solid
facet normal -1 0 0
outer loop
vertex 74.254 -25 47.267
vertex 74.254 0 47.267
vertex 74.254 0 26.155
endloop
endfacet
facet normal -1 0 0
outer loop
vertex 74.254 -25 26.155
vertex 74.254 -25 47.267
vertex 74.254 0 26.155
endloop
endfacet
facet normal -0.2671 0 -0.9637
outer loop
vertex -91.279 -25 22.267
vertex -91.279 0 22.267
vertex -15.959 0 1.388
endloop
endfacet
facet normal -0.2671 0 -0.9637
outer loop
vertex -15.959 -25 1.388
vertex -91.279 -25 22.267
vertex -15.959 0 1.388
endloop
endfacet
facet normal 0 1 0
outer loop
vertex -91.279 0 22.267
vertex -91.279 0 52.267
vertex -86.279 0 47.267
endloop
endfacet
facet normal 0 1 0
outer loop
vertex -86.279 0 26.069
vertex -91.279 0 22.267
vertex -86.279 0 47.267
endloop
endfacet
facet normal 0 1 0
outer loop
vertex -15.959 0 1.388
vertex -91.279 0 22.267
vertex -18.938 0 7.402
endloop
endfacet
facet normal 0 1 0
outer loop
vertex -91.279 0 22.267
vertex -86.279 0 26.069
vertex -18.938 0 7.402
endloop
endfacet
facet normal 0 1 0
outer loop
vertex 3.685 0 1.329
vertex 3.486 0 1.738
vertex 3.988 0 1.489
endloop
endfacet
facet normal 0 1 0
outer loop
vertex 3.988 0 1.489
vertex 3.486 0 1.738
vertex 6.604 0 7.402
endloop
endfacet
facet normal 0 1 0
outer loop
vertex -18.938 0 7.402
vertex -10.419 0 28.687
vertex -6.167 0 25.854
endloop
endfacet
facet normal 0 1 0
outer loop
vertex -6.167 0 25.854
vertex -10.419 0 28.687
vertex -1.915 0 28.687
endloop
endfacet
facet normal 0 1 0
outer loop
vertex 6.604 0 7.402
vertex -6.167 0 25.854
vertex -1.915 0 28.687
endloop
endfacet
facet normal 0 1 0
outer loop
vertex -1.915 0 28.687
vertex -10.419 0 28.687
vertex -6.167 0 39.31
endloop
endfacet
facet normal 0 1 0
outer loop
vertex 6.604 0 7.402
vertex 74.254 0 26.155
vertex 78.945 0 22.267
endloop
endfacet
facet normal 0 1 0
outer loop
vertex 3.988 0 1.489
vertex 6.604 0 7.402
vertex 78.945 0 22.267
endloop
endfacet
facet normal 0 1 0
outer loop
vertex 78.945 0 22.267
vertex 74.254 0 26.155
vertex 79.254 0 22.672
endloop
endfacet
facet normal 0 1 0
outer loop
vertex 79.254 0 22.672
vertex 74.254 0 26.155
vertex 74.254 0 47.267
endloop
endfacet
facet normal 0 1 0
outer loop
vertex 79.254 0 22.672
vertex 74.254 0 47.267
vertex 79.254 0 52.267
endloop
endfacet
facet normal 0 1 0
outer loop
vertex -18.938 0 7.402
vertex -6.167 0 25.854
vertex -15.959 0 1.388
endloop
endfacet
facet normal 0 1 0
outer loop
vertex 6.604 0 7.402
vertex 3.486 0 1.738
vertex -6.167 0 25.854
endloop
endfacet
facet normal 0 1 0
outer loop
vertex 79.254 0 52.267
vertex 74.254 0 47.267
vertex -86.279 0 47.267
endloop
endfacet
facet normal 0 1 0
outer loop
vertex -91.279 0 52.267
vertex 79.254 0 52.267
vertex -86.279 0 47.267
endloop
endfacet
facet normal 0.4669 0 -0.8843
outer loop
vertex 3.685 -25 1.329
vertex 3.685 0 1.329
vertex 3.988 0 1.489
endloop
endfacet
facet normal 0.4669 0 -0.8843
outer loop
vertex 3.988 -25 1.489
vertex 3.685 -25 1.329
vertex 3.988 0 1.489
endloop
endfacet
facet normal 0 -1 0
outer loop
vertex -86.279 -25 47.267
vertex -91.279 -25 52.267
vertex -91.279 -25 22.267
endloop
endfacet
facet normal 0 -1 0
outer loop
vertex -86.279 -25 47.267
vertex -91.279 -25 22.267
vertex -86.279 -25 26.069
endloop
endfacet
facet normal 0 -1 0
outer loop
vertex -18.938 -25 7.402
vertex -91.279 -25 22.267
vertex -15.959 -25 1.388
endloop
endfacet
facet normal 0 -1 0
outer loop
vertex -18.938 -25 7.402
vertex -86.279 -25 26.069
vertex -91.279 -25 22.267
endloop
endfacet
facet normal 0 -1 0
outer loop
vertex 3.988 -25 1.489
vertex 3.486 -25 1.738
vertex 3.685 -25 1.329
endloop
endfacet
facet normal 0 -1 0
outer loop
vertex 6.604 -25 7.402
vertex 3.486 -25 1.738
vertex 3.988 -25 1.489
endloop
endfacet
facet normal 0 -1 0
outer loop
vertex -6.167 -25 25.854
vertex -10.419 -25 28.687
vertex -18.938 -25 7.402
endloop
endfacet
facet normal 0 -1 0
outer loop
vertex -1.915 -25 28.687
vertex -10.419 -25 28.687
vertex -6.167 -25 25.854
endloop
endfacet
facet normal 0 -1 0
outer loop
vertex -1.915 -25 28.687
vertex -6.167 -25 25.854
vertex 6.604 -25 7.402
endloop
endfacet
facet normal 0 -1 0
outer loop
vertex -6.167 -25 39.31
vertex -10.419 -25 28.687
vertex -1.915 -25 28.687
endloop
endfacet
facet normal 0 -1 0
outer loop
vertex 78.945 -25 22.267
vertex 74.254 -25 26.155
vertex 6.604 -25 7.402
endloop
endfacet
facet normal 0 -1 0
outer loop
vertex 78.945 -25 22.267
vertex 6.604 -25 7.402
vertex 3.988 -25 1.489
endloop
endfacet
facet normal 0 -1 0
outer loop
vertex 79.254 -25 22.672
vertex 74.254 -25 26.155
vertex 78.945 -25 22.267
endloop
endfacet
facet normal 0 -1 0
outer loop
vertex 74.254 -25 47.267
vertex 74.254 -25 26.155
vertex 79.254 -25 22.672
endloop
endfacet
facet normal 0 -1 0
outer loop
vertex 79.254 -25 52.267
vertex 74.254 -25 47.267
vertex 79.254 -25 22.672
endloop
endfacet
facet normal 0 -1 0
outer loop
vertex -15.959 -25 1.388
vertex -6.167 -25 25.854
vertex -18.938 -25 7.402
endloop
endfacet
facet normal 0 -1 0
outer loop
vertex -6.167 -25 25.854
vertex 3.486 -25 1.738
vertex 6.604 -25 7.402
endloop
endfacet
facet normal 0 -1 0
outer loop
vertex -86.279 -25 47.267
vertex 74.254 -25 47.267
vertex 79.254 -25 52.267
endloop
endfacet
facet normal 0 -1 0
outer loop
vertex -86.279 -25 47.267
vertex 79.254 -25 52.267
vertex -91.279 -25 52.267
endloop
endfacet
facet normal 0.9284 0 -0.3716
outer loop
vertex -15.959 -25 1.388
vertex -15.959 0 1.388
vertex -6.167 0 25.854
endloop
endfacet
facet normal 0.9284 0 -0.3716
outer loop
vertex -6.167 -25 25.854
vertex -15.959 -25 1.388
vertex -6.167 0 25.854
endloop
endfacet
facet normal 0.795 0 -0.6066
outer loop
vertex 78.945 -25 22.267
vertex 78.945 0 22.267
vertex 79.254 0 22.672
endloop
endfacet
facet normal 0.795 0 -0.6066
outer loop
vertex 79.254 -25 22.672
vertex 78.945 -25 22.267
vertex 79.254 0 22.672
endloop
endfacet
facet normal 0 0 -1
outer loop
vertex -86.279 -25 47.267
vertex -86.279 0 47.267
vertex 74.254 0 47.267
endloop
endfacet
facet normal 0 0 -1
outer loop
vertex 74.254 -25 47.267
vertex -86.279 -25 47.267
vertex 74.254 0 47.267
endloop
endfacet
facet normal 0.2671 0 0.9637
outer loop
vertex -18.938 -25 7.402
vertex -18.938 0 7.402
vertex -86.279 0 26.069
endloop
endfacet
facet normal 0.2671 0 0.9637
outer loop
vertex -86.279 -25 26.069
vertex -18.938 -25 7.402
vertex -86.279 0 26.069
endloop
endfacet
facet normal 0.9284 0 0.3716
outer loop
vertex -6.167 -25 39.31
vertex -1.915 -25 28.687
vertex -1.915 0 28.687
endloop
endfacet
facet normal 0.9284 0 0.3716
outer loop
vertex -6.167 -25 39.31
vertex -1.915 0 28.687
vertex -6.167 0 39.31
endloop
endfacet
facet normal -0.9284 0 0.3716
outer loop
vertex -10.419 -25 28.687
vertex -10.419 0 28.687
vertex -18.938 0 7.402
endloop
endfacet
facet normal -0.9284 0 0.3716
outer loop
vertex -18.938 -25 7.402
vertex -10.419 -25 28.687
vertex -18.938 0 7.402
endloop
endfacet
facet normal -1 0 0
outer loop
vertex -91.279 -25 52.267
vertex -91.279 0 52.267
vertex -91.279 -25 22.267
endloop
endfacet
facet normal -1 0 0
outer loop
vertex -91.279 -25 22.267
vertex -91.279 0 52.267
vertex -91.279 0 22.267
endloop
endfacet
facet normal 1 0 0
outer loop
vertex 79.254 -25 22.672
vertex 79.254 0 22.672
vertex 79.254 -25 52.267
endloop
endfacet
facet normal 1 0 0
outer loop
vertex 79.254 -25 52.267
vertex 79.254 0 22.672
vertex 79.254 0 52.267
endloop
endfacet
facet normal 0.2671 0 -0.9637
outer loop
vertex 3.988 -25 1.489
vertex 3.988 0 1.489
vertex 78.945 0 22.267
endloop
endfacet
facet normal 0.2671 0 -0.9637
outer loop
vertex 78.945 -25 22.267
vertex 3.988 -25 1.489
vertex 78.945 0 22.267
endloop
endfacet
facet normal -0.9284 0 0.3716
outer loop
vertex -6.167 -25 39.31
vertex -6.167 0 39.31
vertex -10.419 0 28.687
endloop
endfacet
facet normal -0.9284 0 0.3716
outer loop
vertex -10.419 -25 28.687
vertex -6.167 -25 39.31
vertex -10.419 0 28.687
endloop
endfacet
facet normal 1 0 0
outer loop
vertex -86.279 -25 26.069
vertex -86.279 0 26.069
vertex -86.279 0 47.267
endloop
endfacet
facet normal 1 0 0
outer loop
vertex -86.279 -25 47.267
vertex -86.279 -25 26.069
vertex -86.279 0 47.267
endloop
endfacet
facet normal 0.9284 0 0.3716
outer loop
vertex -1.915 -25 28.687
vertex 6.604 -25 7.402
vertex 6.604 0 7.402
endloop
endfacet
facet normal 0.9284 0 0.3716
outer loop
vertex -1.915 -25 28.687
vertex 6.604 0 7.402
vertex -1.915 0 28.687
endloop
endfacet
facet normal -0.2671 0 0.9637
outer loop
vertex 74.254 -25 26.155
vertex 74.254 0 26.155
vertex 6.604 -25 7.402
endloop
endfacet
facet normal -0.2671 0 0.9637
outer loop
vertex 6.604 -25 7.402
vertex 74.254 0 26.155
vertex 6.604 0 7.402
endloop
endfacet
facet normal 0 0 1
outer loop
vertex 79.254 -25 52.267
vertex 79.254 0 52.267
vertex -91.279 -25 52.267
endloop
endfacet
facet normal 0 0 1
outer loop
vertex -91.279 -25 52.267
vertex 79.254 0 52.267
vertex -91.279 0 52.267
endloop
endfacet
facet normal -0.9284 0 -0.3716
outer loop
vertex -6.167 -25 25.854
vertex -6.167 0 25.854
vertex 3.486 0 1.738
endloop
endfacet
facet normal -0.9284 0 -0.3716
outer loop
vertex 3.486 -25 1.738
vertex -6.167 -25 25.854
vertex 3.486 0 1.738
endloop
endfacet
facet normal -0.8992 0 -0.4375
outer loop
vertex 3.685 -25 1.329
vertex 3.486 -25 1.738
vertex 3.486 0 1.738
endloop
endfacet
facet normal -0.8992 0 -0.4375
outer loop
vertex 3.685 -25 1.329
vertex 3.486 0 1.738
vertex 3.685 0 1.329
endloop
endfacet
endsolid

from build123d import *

# Parameters (mm, degrees)
F1_DEPTH = 25


with BuildPart() as f1:
    # F0 (on Front) → F1 (new body)
    with BuildSketch(Plane.XZ):
        Polygon((78.72085, 52.266717), (-6.27915, 52.266717), (-46.589765, 52.266717), (-48.77915, 52.266717), (-91.27915, 52.266717), (-91.27915, 22.266717), (-15.959248, 1.38831), (-6.166846, 25.853948), (3.485681, 1.737779), (3.685383, 1.328899), (3.988301, 1.488861), (78.945459, 22.266717), (79.253574, 22.671859), (79.253574, 52.266717), align=None)
        Polygon((74.253574, 26.154683), (6.604014, 7.402467), (-1.91518, 28.687084), (-6.166846, 39.309575), (-10.418511, 28.687084), (-18.937705, 7.402467), (-86.27915, 26.069274), (-86.27915, 47.266717), (-6.27915, 47.266717), (74.253574, 47.266717), align=None, mode=Mode.SUBTRACT)
    extrude(amount=F1_DEPTH)


solid = f1.part
